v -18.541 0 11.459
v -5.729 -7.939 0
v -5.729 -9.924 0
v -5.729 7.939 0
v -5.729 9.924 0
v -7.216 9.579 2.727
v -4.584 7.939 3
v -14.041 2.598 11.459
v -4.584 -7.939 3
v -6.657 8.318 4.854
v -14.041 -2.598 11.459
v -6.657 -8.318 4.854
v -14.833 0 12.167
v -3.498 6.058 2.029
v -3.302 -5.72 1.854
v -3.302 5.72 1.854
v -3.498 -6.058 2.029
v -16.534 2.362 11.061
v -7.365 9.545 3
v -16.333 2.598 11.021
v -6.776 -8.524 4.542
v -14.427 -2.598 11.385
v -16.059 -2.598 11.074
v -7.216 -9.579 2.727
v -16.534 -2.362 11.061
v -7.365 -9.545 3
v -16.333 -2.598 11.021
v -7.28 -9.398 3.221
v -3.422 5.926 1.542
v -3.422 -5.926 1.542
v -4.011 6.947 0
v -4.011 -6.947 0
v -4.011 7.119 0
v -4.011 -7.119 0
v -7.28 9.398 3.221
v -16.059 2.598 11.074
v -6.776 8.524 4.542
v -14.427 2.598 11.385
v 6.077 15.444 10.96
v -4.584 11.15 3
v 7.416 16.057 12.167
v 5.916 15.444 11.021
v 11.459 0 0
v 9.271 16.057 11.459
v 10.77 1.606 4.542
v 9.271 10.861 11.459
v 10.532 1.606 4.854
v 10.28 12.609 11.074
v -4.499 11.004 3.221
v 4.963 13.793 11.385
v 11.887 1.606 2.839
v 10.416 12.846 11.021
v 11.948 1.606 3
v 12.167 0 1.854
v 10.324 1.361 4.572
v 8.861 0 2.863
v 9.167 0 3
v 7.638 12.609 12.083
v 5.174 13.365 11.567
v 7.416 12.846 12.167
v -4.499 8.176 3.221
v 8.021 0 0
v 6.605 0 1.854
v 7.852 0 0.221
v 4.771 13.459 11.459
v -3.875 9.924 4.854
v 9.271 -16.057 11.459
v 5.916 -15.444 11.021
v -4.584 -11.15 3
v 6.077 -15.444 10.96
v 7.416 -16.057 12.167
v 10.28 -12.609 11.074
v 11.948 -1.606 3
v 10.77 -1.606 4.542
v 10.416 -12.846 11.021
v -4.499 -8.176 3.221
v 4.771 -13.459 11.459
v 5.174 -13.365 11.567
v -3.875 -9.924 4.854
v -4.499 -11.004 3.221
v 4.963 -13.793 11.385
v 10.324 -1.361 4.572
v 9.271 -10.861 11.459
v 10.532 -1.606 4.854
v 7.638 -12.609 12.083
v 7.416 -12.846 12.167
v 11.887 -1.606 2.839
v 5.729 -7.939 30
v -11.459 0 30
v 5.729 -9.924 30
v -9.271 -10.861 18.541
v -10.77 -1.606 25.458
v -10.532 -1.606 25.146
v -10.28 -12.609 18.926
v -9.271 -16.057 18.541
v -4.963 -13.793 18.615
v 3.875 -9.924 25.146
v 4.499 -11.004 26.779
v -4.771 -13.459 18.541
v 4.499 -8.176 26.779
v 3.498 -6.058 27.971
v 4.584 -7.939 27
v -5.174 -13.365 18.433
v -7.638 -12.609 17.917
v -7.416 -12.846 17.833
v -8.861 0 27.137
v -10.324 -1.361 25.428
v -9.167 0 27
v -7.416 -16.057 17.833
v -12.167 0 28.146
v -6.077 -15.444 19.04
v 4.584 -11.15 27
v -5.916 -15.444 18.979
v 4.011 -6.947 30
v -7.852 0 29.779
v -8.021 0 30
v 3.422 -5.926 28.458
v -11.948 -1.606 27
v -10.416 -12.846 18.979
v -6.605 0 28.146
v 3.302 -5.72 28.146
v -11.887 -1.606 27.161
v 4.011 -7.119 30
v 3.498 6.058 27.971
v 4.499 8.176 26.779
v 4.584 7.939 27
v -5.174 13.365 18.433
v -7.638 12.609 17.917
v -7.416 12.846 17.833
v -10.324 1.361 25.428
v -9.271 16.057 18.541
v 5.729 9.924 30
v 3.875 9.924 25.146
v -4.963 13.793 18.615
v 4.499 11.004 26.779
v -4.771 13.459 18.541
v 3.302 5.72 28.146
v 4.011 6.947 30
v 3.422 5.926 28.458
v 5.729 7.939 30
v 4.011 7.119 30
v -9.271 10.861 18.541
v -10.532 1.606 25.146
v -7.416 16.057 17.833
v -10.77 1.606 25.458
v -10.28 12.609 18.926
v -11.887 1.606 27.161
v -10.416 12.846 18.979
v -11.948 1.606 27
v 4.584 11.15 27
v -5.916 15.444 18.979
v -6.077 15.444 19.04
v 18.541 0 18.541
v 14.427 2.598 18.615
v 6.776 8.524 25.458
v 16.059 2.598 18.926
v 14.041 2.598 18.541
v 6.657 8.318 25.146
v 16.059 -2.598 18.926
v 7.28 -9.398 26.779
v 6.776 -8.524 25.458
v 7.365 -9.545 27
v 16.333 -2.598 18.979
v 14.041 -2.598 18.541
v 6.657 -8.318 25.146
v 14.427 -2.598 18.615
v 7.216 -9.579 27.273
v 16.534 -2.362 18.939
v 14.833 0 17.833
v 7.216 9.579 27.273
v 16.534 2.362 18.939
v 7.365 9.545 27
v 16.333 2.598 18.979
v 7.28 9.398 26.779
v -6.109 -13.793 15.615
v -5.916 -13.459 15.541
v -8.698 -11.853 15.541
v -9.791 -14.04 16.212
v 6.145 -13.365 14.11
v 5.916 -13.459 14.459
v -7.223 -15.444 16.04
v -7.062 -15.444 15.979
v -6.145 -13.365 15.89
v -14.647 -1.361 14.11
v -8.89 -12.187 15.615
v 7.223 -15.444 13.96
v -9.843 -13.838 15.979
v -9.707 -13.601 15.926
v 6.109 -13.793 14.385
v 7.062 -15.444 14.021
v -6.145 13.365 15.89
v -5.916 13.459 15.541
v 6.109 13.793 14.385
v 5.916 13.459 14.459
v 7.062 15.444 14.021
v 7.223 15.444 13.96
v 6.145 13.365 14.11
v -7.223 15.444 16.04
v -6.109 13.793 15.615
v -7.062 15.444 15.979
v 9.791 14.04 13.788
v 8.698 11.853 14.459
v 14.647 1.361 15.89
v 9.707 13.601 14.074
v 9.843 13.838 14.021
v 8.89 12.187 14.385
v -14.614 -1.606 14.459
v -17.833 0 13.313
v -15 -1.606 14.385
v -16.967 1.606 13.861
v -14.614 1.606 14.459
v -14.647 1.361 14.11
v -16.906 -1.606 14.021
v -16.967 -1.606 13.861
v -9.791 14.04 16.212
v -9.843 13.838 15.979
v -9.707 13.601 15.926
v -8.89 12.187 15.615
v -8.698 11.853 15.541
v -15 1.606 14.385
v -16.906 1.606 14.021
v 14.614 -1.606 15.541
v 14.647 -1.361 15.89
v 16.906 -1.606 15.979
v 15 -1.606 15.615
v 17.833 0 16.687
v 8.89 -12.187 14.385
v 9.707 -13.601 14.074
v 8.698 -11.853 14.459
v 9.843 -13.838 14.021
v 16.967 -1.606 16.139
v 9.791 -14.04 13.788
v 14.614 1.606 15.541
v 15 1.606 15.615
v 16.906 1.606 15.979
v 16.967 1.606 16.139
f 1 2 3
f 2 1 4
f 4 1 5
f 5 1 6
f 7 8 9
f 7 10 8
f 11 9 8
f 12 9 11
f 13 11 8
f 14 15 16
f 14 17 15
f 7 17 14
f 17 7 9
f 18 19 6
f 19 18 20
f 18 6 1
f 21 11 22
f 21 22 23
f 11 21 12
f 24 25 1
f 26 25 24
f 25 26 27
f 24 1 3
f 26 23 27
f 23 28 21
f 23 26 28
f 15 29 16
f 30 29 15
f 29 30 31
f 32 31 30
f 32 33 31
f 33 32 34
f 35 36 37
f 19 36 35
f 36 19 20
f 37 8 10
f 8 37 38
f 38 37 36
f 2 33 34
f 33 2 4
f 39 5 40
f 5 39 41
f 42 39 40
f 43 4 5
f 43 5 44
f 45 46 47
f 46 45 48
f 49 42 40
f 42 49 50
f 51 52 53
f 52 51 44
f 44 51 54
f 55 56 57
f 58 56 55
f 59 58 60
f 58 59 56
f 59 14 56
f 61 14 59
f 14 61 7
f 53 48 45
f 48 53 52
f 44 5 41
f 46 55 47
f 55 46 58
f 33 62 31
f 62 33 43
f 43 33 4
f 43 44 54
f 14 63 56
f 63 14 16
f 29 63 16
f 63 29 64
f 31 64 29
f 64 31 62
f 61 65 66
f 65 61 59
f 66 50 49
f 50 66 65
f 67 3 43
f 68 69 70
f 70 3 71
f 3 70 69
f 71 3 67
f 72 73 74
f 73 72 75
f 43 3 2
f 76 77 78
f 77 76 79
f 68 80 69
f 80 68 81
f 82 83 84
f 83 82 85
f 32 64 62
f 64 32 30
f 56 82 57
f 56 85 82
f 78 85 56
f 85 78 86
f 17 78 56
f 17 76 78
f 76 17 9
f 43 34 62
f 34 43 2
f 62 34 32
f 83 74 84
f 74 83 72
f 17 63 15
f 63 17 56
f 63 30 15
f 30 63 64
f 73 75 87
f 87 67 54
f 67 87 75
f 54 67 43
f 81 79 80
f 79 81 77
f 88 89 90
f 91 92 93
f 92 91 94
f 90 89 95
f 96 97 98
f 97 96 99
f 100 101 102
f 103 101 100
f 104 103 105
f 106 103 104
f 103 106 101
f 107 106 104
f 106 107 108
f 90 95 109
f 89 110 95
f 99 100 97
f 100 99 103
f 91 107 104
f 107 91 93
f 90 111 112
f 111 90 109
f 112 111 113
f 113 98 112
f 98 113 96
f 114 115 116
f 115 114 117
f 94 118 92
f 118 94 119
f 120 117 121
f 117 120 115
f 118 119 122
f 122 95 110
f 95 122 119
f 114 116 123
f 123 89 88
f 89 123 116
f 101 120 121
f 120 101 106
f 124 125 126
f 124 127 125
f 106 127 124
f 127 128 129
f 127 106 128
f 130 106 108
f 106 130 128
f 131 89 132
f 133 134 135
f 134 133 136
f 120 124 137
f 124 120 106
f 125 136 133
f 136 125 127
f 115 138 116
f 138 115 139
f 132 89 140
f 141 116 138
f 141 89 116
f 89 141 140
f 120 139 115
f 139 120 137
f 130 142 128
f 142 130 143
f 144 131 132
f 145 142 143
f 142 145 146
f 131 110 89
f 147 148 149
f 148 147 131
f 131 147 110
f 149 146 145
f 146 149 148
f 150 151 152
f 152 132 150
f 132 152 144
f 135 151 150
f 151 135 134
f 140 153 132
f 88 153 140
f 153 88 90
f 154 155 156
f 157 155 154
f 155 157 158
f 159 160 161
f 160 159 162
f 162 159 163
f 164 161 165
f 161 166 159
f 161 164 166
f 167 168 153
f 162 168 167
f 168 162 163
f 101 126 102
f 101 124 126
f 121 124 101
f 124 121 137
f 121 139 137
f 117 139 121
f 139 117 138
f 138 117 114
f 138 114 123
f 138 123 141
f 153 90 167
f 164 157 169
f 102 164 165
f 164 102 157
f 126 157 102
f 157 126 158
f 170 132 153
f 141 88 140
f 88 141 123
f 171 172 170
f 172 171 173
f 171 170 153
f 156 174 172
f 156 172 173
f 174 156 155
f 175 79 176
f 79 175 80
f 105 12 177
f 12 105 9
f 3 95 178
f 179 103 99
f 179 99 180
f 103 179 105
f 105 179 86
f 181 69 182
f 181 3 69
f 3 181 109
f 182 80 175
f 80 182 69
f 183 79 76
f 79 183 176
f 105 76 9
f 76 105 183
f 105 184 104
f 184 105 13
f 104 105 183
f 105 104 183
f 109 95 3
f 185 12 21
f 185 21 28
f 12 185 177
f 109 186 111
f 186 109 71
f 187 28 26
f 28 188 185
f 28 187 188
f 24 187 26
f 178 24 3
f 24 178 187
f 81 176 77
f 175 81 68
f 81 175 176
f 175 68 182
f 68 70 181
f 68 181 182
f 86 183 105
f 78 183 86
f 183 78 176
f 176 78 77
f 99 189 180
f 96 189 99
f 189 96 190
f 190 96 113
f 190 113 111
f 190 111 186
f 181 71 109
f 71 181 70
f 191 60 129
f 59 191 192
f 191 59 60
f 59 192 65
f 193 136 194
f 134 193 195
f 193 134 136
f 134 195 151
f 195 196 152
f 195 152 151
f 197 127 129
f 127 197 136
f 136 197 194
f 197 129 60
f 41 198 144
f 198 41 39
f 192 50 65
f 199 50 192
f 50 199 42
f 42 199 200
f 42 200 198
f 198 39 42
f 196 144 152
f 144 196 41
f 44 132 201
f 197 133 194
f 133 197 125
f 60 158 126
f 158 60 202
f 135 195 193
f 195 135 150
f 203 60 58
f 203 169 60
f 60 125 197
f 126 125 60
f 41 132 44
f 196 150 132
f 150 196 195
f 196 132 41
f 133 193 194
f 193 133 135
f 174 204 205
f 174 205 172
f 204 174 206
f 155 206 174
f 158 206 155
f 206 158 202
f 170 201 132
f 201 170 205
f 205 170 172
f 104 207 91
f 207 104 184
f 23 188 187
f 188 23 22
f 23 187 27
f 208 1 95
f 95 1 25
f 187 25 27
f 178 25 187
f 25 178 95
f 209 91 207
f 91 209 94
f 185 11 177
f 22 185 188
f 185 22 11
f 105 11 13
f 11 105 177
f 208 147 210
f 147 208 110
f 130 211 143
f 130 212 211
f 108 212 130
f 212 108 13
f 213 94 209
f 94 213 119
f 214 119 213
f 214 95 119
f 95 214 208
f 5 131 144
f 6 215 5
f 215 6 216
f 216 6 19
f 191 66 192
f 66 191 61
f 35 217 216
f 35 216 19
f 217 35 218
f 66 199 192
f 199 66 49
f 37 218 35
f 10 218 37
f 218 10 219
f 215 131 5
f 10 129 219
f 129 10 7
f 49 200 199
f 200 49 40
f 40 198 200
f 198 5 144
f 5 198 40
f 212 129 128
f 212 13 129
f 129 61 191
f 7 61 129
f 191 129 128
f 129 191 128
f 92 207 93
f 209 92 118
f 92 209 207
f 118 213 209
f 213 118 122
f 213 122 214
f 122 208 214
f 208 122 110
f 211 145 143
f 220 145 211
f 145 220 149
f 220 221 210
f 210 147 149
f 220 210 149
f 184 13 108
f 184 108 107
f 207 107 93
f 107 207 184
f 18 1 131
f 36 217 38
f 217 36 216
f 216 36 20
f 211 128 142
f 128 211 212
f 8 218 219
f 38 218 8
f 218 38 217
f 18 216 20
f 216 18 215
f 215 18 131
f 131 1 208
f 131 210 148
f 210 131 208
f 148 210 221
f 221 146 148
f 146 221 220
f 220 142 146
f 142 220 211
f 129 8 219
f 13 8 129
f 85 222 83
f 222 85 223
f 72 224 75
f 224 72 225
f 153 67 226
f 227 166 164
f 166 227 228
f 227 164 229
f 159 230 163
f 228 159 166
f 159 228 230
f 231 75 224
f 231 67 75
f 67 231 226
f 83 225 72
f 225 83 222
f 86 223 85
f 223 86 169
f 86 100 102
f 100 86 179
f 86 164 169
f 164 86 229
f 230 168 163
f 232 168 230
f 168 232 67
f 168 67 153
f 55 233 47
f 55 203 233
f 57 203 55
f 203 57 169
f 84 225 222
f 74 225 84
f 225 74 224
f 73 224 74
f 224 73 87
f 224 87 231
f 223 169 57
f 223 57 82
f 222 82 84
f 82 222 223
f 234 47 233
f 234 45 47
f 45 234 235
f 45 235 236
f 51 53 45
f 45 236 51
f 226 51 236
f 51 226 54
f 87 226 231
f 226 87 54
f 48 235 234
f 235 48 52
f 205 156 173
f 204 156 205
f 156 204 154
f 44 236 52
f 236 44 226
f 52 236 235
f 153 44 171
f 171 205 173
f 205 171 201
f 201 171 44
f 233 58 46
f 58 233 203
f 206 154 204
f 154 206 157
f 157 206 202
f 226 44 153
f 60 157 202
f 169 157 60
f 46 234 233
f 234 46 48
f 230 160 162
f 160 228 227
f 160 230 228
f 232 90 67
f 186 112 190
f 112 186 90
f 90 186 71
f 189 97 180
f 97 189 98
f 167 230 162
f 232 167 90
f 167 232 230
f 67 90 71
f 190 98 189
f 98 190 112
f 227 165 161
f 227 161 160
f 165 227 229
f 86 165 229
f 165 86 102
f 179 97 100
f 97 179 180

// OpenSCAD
// shape height
sh = 30;
// border width
bw = 3;

include <../polyhedra.scad>;

poly_wire(icosahedron, fid = 1, fill_face_ids = [0, 4, 5, 14, 15, 19]);
